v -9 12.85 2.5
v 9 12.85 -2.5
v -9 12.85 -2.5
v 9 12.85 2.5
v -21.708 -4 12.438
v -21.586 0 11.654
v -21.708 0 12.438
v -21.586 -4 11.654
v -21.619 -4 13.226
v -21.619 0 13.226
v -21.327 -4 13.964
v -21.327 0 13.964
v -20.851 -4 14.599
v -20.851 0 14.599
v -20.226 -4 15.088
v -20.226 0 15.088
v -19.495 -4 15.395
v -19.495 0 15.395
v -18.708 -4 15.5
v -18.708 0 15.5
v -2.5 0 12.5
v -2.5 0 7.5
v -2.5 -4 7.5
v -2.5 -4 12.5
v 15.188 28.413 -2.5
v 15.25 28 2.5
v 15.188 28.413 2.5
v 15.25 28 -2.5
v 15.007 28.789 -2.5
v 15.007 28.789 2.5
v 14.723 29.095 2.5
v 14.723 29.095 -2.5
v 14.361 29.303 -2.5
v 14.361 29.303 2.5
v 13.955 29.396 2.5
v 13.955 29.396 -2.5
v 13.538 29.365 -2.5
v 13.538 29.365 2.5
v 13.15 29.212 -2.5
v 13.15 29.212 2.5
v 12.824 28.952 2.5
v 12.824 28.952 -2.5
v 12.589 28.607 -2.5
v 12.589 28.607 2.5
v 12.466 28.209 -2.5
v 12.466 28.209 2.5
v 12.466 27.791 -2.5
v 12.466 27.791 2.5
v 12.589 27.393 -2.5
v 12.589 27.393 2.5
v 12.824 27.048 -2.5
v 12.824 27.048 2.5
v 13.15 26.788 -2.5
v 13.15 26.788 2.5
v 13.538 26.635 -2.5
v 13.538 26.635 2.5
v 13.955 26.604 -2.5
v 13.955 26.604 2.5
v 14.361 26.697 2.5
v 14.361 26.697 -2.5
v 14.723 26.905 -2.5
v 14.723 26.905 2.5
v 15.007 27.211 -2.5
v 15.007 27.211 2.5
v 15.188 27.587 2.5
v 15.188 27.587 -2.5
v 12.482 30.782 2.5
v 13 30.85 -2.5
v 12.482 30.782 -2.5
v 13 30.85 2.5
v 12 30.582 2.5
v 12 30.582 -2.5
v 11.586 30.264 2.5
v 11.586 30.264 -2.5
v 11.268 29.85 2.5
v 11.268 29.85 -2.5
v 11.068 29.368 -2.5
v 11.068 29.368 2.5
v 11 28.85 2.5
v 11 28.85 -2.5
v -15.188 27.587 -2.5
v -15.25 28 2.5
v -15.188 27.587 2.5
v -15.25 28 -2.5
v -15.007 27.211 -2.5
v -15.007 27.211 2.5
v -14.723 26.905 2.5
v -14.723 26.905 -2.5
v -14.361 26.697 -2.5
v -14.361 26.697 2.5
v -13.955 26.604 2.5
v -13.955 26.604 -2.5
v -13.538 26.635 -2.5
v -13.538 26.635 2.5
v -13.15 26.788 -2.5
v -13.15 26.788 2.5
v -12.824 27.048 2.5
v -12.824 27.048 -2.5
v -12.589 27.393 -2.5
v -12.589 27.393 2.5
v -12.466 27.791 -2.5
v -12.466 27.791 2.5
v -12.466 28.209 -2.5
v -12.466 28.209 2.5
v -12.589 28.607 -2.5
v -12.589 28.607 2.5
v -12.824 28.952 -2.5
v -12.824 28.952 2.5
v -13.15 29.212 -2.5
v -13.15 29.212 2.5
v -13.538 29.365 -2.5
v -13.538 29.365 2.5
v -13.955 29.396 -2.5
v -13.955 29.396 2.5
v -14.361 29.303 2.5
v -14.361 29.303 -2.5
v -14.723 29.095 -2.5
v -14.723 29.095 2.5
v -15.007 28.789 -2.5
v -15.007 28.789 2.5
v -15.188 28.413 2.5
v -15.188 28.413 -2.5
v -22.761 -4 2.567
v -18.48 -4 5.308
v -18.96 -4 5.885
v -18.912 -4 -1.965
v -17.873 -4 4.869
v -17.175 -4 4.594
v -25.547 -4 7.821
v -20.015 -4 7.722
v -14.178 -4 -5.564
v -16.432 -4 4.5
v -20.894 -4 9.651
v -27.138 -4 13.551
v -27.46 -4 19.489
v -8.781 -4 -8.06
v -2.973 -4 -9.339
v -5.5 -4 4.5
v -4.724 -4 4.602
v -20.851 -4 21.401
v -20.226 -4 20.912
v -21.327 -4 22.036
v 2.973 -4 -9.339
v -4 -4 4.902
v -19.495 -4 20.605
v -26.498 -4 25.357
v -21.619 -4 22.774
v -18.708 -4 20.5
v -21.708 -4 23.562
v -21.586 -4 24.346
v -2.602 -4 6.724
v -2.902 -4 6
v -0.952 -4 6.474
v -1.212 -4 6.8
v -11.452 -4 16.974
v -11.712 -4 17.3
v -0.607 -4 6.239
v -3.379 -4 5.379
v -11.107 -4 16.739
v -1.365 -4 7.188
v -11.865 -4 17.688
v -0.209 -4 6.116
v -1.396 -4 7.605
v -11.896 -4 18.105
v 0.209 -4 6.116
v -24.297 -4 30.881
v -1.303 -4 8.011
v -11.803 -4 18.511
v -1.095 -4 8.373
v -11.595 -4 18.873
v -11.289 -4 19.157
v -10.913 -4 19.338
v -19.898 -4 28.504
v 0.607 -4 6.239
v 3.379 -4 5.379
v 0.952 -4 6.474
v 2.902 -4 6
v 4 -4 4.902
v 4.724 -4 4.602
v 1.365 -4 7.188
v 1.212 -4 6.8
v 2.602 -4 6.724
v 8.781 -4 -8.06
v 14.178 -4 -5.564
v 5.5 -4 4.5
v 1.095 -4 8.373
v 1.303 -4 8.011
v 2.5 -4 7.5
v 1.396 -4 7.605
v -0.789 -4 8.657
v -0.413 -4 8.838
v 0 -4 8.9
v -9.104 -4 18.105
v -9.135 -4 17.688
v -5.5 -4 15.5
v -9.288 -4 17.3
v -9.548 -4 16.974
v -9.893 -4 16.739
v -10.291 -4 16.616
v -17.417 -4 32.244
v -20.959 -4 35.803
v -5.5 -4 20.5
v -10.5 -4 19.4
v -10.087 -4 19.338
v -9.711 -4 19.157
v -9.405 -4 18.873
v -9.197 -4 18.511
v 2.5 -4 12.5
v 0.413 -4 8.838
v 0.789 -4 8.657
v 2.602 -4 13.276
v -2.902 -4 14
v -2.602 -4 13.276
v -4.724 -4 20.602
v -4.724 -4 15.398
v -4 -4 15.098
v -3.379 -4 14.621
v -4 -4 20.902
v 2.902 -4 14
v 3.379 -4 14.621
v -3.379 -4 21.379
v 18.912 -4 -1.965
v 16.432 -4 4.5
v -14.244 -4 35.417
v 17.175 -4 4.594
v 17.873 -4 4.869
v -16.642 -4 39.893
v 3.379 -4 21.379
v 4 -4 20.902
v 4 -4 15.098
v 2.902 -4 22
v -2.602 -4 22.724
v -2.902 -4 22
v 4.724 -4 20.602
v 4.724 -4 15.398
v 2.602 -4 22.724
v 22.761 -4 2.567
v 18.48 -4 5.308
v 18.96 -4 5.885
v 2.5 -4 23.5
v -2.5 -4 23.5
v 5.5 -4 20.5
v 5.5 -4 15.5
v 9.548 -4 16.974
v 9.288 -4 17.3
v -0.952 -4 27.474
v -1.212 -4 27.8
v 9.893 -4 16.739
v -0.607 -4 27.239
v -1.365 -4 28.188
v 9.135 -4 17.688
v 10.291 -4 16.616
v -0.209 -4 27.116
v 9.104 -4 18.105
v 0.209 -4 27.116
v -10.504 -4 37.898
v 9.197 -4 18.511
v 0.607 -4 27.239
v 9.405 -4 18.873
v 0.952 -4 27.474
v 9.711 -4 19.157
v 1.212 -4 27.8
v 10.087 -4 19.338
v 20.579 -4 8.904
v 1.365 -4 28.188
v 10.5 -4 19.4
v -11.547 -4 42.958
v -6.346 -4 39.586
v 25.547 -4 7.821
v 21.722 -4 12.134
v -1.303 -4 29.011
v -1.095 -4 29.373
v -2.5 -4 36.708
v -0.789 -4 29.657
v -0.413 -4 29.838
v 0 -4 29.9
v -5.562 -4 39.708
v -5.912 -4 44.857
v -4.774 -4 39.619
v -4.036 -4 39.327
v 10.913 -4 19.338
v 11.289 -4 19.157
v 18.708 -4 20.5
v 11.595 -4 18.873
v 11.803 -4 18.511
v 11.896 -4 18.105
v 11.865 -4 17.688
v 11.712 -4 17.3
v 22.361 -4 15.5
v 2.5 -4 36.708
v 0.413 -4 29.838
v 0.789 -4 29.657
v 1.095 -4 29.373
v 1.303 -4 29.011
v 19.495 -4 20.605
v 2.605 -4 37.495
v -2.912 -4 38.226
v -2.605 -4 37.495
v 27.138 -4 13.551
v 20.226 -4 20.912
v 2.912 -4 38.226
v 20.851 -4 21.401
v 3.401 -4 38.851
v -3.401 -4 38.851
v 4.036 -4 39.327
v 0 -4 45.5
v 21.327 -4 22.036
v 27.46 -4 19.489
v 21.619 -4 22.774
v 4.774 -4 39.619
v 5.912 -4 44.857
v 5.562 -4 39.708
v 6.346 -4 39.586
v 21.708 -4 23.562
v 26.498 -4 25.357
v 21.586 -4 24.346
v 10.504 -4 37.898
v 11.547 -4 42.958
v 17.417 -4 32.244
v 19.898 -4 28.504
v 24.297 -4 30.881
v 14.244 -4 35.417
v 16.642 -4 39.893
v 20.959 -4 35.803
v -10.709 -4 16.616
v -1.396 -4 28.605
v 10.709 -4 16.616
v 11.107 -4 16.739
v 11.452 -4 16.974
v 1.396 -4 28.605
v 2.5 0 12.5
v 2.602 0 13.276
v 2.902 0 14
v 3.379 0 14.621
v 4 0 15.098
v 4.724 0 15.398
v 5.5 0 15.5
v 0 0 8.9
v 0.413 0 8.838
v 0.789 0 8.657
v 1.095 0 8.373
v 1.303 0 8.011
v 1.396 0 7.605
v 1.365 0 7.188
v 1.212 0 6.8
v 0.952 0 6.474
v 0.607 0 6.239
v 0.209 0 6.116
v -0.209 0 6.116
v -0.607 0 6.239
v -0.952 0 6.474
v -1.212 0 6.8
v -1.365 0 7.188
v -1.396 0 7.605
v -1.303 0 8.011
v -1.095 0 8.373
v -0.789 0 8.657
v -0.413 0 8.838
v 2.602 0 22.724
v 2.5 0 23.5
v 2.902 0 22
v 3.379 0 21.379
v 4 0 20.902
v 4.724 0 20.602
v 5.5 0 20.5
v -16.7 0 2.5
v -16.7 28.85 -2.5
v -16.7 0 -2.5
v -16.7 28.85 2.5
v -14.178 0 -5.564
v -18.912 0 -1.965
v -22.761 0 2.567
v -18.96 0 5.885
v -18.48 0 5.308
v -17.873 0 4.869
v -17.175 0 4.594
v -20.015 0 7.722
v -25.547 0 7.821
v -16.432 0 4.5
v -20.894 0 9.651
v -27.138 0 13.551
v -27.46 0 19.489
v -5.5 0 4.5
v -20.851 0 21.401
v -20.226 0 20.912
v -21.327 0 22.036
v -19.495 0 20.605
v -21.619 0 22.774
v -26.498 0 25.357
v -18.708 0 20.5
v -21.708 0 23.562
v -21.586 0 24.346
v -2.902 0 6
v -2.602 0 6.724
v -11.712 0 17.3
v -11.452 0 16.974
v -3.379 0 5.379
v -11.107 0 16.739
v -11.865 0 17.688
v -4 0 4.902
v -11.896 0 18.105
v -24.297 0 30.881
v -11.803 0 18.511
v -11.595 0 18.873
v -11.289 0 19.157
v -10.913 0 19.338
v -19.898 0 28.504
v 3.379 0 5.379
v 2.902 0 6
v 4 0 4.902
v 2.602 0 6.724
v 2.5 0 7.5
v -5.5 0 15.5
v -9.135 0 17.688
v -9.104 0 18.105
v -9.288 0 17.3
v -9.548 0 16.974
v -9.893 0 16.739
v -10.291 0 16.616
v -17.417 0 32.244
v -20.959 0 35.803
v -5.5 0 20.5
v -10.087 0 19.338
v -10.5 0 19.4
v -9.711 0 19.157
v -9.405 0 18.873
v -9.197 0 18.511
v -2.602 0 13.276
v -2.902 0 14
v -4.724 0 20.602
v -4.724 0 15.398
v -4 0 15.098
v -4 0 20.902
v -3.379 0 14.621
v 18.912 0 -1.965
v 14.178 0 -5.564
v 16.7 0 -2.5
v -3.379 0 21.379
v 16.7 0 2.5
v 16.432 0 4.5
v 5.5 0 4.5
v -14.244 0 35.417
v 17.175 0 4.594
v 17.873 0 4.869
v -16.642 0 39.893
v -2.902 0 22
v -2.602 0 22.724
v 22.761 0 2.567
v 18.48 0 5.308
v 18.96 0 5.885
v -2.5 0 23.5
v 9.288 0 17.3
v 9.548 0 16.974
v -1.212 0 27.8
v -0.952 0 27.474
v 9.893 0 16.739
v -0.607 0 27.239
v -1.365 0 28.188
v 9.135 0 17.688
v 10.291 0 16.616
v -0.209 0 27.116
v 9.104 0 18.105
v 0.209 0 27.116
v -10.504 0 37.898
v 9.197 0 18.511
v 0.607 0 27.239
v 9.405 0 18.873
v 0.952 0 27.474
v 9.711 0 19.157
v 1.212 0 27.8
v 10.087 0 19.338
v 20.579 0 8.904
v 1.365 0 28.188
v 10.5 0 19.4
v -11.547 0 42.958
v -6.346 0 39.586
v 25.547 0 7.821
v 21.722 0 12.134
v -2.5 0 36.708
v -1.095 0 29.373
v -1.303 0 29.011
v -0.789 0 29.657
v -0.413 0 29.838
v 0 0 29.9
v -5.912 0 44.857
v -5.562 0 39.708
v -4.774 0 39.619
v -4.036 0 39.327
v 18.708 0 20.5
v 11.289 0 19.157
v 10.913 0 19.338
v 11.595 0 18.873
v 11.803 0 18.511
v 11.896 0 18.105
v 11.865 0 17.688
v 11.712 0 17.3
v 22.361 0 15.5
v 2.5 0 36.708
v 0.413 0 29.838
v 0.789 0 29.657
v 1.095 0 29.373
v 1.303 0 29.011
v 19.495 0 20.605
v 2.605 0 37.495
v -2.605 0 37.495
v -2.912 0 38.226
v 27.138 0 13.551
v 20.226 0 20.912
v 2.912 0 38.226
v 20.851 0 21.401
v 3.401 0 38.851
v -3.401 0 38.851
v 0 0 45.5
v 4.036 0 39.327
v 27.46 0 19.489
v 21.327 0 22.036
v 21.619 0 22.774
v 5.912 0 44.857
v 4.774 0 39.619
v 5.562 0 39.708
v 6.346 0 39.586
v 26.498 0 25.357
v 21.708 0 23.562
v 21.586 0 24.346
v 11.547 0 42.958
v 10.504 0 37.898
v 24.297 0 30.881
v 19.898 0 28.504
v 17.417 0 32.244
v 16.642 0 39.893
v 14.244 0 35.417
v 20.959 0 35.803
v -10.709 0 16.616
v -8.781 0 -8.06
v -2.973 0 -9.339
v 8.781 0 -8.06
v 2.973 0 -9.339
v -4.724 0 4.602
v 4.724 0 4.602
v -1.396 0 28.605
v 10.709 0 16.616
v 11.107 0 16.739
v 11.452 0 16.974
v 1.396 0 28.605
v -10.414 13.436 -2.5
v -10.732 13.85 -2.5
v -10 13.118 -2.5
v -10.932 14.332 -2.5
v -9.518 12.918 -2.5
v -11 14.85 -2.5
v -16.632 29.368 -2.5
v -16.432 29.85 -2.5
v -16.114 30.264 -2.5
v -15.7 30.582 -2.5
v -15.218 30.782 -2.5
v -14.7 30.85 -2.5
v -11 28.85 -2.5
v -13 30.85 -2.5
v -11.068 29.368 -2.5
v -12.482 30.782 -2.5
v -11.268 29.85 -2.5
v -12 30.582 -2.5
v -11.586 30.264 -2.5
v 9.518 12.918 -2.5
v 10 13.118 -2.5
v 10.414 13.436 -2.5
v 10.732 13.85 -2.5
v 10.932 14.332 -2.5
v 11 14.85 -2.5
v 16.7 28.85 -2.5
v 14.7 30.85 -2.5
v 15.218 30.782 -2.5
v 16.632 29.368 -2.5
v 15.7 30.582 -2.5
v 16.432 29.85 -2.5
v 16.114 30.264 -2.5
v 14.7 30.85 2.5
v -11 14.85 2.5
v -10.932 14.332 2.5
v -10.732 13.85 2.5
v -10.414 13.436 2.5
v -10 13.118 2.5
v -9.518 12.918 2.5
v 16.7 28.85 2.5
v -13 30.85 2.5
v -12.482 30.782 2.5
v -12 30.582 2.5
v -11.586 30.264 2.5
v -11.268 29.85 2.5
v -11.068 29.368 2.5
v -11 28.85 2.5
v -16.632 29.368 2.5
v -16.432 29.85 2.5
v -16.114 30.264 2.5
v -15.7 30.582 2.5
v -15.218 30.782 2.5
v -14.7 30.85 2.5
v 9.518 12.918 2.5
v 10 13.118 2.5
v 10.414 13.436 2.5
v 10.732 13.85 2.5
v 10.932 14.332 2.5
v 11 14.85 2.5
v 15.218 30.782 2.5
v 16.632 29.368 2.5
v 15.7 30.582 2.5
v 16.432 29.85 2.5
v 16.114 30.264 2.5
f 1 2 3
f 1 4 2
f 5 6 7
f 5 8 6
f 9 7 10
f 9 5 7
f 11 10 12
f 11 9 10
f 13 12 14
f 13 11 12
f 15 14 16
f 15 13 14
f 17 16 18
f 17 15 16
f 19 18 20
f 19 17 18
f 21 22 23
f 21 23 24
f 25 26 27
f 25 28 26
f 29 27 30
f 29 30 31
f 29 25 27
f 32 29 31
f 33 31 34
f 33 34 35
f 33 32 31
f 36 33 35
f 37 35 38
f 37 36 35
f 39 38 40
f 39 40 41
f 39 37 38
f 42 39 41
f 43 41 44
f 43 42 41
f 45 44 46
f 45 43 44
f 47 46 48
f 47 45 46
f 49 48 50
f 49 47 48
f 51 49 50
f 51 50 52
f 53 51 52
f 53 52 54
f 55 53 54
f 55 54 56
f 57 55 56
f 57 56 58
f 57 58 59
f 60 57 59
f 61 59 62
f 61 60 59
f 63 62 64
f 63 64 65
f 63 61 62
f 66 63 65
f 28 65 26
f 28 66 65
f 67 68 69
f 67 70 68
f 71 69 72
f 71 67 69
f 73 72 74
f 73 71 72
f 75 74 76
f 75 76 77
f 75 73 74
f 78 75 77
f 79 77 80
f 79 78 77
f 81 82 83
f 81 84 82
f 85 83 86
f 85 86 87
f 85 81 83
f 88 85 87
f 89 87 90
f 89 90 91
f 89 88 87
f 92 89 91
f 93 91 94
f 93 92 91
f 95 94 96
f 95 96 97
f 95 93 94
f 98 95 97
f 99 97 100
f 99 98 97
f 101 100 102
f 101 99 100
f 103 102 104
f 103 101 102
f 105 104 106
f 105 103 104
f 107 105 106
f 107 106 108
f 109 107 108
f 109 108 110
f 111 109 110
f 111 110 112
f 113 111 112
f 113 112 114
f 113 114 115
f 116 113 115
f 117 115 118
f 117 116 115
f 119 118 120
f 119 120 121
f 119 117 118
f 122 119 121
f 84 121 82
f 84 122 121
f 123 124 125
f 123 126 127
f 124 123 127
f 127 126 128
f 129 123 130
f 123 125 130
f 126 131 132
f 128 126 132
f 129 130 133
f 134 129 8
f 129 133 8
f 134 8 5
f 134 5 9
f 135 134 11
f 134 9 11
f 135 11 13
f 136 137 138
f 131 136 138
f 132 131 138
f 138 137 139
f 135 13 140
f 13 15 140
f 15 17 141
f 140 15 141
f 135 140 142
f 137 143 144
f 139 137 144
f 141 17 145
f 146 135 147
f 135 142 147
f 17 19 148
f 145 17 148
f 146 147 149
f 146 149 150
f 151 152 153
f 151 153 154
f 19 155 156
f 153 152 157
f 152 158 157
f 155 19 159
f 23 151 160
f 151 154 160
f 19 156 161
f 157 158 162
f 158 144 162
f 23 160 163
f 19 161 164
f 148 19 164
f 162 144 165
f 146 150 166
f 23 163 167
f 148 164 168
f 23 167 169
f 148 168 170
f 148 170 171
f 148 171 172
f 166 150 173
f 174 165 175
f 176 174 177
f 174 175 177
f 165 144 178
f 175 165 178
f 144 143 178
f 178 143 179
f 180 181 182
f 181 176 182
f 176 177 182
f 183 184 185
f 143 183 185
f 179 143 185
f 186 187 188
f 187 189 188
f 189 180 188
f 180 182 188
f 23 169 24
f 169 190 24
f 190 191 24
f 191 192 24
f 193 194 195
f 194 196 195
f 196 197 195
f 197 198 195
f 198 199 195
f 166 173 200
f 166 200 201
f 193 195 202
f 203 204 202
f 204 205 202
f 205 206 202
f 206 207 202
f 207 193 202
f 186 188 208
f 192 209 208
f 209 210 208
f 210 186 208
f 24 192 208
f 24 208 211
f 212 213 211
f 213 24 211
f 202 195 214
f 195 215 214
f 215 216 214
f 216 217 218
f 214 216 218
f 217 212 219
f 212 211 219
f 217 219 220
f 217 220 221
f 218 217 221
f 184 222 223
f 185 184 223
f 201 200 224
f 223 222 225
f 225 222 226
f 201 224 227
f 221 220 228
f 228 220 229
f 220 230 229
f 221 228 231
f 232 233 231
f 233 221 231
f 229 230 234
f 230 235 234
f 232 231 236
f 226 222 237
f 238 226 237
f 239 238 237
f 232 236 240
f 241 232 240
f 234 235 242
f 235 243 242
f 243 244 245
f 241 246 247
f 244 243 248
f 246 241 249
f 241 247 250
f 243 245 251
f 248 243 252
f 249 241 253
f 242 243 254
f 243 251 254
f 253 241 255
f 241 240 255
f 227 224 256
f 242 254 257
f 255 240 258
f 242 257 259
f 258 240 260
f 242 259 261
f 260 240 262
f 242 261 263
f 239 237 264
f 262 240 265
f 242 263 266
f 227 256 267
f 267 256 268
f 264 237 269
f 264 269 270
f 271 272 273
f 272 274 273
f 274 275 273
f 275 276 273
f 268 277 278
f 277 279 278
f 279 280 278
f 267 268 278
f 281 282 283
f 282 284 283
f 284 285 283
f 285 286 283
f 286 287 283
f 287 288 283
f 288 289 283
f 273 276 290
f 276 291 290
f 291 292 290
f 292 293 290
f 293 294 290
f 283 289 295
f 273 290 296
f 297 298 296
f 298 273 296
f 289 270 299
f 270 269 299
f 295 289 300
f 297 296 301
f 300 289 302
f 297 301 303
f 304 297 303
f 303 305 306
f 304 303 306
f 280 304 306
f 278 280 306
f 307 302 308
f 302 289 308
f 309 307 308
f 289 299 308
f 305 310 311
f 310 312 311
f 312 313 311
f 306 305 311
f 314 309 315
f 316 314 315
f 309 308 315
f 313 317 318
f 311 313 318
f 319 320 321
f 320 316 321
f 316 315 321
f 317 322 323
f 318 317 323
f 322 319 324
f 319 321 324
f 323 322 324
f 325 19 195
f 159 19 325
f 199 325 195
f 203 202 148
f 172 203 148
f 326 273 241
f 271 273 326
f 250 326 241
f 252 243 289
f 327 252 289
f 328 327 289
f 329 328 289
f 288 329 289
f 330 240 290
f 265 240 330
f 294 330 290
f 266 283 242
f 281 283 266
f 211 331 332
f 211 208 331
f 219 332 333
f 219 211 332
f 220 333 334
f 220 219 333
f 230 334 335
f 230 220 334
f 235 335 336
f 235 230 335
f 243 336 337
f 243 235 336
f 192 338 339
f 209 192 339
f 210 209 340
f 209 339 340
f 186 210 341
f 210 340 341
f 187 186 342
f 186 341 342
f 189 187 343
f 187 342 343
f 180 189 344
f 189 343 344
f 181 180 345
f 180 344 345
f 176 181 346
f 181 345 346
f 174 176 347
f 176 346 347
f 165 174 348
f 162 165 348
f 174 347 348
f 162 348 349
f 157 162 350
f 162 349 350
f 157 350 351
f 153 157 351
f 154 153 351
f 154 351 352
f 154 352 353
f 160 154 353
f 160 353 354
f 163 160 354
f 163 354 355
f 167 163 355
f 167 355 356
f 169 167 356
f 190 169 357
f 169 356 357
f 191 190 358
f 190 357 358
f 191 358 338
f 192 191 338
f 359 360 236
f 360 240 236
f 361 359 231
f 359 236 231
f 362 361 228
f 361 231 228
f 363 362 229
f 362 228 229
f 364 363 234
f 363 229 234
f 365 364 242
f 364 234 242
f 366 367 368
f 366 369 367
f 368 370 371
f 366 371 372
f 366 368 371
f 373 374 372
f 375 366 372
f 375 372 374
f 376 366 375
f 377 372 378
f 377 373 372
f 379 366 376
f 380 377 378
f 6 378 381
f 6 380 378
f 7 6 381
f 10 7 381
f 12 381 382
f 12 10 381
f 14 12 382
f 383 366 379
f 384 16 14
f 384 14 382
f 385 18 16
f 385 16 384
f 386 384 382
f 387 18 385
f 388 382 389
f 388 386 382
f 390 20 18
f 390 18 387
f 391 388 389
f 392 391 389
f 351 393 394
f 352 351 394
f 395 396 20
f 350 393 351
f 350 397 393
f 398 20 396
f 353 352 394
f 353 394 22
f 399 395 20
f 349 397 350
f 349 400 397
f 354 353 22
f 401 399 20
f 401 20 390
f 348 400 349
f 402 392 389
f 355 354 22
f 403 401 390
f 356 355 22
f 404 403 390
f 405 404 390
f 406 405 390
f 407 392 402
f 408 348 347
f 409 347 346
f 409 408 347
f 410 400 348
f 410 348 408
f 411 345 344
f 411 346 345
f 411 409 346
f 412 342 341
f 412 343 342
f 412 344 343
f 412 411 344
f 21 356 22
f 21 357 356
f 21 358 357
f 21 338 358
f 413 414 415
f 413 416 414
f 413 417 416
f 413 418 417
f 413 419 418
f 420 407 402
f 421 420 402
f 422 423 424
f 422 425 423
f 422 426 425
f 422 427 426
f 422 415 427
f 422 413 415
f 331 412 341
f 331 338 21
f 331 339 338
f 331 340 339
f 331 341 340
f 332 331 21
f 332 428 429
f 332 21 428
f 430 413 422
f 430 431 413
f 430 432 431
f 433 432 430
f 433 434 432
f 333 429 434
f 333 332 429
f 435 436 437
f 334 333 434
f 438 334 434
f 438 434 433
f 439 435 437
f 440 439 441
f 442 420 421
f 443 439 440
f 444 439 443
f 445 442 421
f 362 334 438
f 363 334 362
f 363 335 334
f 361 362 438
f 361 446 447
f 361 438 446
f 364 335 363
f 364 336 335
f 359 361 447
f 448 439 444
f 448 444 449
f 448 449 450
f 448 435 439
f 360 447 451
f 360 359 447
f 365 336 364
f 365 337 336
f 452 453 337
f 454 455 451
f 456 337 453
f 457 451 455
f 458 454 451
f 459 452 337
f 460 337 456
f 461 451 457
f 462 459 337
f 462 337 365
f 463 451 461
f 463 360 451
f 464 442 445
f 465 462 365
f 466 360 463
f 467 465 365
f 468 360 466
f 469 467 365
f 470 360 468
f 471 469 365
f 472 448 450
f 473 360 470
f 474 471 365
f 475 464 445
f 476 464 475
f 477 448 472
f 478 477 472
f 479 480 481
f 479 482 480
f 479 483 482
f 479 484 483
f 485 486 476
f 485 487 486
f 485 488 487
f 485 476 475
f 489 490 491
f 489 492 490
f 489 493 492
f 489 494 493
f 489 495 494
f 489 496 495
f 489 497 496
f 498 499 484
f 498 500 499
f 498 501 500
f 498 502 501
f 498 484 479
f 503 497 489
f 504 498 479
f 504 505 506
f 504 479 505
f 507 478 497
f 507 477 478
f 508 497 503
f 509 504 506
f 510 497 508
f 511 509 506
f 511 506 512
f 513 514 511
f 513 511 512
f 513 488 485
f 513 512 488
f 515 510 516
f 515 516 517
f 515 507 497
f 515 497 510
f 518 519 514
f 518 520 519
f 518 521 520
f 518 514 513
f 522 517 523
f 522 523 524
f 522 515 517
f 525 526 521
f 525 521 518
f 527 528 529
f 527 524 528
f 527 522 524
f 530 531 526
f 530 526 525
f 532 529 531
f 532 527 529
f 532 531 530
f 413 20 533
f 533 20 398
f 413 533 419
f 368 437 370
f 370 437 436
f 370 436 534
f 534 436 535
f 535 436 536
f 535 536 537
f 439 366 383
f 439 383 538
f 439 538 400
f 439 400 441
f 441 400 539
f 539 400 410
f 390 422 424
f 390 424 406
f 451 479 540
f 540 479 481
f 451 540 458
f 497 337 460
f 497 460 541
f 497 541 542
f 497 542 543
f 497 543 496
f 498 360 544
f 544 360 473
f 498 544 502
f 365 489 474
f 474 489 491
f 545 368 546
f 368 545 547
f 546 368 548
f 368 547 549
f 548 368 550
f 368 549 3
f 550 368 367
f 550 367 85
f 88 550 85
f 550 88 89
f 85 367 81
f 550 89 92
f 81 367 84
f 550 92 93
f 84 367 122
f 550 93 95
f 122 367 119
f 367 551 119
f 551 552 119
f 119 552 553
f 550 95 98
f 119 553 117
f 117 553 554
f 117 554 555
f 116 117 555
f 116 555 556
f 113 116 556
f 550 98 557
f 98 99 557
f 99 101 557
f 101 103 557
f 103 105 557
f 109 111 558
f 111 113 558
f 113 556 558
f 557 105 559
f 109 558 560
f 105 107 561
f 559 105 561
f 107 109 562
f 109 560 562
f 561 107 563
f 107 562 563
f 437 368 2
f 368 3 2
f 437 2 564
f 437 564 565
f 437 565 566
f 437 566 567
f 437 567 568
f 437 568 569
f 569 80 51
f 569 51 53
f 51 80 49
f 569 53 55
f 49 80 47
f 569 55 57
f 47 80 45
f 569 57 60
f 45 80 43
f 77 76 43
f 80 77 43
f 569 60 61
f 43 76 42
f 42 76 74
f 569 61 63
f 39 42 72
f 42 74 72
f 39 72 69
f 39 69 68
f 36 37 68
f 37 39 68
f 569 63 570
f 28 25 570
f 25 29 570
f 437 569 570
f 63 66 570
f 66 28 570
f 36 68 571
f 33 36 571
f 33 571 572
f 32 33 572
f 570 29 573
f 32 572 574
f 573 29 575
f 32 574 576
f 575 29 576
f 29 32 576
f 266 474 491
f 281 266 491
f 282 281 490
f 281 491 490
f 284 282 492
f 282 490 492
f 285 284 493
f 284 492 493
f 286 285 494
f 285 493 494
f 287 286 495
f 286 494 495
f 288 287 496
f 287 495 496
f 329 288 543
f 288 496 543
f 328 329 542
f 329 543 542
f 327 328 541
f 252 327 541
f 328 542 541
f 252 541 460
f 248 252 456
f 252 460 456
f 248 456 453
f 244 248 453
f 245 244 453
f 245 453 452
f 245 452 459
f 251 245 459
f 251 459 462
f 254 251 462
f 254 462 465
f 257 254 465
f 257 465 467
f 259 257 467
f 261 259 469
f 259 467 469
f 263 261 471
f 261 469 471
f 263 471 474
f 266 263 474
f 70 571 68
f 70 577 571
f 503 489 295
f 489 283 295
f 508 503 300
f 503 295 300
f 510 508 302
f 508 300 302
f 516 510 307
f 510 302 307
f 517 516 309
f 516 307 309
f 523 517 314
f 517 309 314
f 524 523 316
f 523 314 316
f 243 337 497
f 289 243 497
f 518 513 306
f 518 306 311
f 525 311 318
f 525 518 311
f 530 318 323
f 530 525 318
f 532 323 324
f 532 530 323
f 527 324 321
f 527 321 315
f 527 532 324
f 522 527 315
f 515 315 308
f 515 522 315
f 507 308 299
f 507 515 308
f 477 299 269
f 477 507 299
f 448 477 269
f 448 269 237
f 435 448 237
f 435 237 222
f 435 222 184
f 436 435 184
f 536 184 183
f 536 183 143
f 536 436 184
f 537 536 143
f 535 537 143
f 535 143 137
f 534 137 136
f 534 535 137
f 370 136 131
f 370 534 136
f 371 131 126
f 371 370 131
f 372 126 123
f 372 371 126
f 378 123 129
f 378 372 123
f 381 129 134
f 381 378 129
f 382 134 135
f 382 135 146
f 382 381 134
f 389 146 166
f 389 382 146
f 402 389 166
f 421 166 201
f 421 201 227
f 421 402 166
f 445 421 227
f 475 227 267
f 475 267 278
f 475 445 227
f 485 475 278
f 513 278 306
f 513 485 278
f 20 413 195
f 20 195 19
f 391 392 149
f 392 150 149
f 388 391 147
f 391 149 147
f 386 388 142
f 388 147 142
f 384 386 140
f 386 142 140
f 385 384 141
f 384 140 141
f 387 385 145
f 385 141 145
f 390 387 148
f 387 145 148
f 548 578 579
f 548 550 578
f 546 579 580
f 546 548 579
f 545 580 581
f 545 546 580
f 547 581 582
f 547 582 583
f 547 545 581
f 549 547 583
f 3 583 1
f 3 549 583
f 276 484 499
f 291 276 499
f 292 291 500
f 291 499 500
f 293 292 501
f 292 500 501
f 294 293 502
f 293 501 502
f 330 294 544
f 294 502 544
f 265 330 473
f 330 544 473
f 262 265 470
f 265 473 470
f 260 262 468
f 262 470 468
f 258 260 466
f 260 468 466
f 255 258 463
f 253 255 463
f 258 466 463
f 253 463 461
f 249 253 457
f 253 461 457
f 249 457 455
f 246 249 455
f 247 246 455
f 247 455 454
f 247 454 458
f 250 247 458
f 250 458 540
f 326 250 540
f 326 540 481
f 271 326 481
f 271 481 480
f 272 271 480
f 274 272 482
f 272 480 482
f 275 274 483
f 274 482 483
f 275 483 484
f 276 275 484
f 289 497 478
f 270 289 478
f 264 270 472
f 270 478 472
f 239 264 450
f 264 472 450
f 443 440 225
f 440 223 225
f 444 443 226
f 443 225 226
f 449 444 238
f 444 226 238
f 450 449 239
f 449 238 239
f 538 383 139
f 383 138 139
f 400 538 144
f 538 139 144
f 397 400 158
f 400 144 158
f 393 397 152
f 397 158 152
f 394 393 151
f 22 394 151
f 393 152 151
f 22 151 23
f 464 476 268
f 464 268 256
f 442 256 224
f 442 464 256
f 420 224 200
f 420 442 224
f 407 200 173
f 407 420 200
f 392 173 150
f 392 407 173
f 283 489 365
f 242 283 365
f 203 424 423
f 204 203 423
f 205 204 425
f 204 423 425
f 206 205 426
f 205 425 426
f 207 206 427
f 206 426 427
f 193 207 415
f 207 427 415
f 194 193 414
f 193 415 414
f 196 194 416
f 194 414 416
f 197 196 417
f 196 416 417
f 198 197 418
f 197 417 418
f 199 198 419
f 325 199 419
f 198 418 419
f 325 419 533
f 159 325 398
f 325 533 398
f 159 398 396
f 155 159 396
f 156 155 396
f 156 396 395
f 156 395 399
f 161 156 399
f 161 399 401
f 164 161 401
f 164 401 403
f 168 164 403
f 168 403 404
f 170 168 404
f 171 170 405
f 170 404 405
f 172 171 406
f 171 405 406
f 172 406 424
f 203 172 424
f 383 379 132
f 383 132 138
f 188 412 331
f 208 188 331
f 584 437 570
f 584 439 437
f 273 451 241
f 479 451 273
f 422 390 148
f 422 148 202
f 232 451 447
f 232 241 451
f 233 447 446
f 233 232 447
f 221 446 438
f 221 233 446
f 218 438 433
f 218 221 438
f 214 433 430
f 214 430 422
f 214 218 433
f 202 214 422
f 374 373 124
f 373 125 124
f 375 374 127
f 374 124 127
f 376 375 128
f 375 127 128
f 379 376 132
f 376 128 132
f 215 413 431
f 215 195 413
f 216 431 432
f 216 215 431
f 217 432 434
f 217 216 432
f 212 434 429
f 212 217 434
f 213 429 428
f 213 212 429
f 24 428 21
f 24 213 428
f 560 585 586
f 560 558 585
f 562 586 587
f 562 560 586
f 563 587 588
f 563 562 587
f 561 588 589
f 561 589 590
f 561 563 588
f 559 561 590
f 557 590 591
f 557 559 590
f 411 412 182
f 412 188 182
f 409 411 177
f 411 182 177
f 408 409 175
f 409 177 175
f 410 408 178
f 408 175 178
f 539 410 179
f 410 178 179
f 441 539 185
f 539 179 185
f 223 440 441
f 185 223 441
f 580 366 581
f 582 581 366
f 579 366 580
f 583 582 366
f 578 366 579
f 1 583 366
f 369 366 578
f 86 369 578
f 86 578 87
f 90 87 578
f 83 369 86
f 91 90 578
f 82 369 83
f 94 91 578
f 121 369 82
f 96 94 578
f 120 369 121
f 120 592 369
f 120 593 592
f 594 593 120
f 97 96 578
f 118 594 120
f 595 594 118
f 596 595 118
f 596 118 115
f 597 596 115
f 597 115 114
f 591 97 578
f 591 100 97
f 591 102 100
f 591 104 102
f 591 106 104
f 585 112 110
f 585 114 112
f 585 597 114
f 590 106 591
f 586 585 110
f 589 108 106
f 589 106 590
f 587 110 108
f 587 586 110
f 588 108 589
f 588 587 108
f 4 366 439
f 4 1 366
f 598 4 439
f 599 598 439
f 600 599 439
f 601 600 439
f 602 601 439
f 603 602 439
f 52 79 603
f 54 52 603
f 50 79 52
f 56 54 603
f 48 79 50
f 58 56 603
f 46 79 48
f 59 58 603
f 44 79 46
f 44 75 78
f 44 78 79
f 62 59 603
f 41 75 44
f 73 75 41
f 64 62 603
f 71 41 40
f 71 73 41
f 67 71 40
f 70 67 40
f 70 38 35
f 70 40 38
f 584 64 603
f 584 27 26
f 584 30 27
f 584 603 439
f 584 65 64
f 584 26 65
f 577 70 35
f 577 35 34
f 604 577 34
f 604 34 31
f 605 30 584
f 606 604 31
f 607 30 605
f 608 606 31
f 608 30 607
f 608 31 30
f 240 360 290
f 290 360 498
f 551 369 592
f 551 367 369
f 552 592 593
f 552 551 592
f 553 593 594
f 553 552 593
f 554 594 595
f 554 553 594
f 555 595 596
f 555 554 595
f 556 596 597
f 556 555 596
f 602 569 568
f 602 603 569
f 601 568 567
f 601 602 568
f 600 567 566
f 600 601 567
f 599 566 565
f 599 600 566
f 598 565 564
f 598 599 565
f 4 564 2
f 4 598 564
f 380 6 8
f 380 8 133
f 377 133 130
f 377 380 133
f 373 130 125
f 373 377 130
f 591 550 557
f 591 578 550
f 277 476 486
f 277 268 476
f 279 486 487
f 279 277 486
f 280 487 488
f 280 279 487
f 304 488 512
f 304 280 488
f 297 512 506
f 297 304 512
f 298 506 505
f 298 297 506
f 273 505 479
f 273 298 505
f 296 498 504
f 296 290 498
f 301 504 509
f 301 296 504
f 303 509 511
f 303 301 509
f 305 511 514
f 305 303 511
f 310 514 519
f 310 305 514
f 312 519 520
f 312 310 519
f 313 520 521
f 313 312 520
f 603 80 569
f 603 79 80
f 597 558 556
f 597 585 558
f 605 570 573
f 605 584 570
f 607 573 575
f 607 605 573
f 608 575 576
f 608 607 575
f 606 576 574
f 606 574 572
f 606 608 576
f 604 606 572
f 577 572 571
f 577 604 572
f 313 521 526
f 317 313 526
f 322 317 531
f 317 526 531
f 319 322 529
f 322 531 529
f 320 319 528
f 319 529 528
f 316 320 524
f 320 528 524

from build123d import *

# Parameters (mm, degrees)
SKETCH1_R           = 1.4
BOSS_EXTRUDE1_DEPTH = 2.5
SKETCH2_R           = 27.5
SKETCH2_R_2         = 1.4
BOSS_EXTRUDE2_DEPTH = 4
FILLET1_R           = 3
FILLET2_R           = 2


with BuildPart() as part:
    # Sketch1 → Boss-Extrude1 (new, symmetric)
    with BuildSketch(Plane.XY):
        Polygon((-16.7, 0), (16.7, 0), (16.7, 30.85), (11, 30.85), (11, 12.85), (-11, 12.85), (-11, 30.85), (-16.7, 30.85), align=None)
        with Locations((13.85, 28)):
            Circle(SKETCH1_R, mode=Mode.SUBTRACT)
        with Locations(Location((-13.85, 28, 0), (0, 0, 180))):
            Circle(SKETCH1_R, mode=Mode.SUBTRACT)
    extrude(amount=BOSS_EXTRUDE1_DEPTH, both=True)

    # Sketch2 → Boss-Extrude2 (add)
    with BuildSketch(Plane(origin=(0, 0, 0), x_dir=(1, 0, 0), z_dir=(0, 1, 0))):
        with Locations(Location((0, -18, 0), (0, 0, 270))):
            Circle(SKETCH2_R)
        with Locations(Location((0, -7.5, 0), (0, 0, 270))):
            Circle(SKETCH2_R_2, mode=Mode.SUBTRACT)
        with Locations(Location((10.5, -18, 0), (0, 0, 270))):
            Circle(SKETCH2_R_2, mode=Mode.SUBTRACT)
        with Locations(Location((0, -28.5, 0), (0, 0, 270))):
            Circle(SKETCH2_R_2, mode=Mode.SUBTRACT)
        with Locations(Location((-10.5, -18, 0), (0, 0, 270))):
            Circle(SKETCH2_R_2, mode=Mode.SUBTRACT)
        with BuildLine():
            Line((-18, -4.5), (-2.5, -4.5))
            Line((-2.5, -4.5), (-2.5, -15.5))
            Line((-2.5, -15.5), (-22.360679775, -15.5))
            ThreePointArc((-22.360679775, -15.5), (-20.916407865, -9.708203932), (-18, -4.5))
        make_face(mode=Mode.SUBTRACT)
        with BuildLine():
            Line((2.5, -4.5), (2.5, -15.5))
            Line((2.5, -15.5), (22.360679775, -15.5))
            ThreePointArc((22.360679775, -15.5), (20.916407865, -9.708203932), (18, -4.5))
            Line((18, -4.5), (2.5, -4.5))
        make_face(mode=Mode.SUBTRACT)
        with BuildLine():
            Line((-22.360679775, -20.5), (-2.5, -20.5))
            Line((-2.5, -20.5), (-2.5, -40.360679775))
            ThreePointArc((-2.5, -40.360679775), (-15.909902577, -33.909902577), (-22.360679775, -20.5))
        make_face(mode=Mode.SUBTRACT)
        with BuildLine():
            Line((2.5, -20.5), (2.5, -40.360679775))
            ThreePointArc((2.5, -40.360679775), (15.909902577, -33.909902577), (22.360679775, -20.5))
            Line((22.360679775, -20.5), (2.5, -20.5))
        make_face(mode=Mode.SUBTRACT)
    extrude(amount=-BOSS_EXTRUDE2_DEPTH)

    # Fillet1
    fillet1_edges = [part.edges().sort_by_distance(p)[0] for p in [
        (-18, -2, 4.5),
        (-22.360679775, -2, 15.5),
        (-2.5, -2, 15.5),
        (-22.360679775, -2, 20.5),
        (-2.5, -2, 40.360679775),
        (18, -2, 4.5),
        (2.5, -2, 4.5),
        (2.5, -2, 40.360679775),
        (22.360679775, -2, 20.5),
        (-2.5, -2, 4.5),
        (-2.5, -2, 20.5),
        (2.5, -2, 15.5),
        (2.5, -2, 20.5),
    ]]
    fillet(fillet1_edges, radius=FILLET1_R)

    # Fillet2
    fillet2_edges = [part.edges().sort_by_distance(p)[0] for p in [
        (-16.7, 30.85, 0),
        (-11, 30.85, 0),
        (-11, 12.85, 0),
        (11, 12.85, 0),
        (11, 30.85, 0),
        (16.7, 30.85, 0),
    ]]
    fillet(fillet2_edges, radius=FILLET2_R)


solid = part.part
